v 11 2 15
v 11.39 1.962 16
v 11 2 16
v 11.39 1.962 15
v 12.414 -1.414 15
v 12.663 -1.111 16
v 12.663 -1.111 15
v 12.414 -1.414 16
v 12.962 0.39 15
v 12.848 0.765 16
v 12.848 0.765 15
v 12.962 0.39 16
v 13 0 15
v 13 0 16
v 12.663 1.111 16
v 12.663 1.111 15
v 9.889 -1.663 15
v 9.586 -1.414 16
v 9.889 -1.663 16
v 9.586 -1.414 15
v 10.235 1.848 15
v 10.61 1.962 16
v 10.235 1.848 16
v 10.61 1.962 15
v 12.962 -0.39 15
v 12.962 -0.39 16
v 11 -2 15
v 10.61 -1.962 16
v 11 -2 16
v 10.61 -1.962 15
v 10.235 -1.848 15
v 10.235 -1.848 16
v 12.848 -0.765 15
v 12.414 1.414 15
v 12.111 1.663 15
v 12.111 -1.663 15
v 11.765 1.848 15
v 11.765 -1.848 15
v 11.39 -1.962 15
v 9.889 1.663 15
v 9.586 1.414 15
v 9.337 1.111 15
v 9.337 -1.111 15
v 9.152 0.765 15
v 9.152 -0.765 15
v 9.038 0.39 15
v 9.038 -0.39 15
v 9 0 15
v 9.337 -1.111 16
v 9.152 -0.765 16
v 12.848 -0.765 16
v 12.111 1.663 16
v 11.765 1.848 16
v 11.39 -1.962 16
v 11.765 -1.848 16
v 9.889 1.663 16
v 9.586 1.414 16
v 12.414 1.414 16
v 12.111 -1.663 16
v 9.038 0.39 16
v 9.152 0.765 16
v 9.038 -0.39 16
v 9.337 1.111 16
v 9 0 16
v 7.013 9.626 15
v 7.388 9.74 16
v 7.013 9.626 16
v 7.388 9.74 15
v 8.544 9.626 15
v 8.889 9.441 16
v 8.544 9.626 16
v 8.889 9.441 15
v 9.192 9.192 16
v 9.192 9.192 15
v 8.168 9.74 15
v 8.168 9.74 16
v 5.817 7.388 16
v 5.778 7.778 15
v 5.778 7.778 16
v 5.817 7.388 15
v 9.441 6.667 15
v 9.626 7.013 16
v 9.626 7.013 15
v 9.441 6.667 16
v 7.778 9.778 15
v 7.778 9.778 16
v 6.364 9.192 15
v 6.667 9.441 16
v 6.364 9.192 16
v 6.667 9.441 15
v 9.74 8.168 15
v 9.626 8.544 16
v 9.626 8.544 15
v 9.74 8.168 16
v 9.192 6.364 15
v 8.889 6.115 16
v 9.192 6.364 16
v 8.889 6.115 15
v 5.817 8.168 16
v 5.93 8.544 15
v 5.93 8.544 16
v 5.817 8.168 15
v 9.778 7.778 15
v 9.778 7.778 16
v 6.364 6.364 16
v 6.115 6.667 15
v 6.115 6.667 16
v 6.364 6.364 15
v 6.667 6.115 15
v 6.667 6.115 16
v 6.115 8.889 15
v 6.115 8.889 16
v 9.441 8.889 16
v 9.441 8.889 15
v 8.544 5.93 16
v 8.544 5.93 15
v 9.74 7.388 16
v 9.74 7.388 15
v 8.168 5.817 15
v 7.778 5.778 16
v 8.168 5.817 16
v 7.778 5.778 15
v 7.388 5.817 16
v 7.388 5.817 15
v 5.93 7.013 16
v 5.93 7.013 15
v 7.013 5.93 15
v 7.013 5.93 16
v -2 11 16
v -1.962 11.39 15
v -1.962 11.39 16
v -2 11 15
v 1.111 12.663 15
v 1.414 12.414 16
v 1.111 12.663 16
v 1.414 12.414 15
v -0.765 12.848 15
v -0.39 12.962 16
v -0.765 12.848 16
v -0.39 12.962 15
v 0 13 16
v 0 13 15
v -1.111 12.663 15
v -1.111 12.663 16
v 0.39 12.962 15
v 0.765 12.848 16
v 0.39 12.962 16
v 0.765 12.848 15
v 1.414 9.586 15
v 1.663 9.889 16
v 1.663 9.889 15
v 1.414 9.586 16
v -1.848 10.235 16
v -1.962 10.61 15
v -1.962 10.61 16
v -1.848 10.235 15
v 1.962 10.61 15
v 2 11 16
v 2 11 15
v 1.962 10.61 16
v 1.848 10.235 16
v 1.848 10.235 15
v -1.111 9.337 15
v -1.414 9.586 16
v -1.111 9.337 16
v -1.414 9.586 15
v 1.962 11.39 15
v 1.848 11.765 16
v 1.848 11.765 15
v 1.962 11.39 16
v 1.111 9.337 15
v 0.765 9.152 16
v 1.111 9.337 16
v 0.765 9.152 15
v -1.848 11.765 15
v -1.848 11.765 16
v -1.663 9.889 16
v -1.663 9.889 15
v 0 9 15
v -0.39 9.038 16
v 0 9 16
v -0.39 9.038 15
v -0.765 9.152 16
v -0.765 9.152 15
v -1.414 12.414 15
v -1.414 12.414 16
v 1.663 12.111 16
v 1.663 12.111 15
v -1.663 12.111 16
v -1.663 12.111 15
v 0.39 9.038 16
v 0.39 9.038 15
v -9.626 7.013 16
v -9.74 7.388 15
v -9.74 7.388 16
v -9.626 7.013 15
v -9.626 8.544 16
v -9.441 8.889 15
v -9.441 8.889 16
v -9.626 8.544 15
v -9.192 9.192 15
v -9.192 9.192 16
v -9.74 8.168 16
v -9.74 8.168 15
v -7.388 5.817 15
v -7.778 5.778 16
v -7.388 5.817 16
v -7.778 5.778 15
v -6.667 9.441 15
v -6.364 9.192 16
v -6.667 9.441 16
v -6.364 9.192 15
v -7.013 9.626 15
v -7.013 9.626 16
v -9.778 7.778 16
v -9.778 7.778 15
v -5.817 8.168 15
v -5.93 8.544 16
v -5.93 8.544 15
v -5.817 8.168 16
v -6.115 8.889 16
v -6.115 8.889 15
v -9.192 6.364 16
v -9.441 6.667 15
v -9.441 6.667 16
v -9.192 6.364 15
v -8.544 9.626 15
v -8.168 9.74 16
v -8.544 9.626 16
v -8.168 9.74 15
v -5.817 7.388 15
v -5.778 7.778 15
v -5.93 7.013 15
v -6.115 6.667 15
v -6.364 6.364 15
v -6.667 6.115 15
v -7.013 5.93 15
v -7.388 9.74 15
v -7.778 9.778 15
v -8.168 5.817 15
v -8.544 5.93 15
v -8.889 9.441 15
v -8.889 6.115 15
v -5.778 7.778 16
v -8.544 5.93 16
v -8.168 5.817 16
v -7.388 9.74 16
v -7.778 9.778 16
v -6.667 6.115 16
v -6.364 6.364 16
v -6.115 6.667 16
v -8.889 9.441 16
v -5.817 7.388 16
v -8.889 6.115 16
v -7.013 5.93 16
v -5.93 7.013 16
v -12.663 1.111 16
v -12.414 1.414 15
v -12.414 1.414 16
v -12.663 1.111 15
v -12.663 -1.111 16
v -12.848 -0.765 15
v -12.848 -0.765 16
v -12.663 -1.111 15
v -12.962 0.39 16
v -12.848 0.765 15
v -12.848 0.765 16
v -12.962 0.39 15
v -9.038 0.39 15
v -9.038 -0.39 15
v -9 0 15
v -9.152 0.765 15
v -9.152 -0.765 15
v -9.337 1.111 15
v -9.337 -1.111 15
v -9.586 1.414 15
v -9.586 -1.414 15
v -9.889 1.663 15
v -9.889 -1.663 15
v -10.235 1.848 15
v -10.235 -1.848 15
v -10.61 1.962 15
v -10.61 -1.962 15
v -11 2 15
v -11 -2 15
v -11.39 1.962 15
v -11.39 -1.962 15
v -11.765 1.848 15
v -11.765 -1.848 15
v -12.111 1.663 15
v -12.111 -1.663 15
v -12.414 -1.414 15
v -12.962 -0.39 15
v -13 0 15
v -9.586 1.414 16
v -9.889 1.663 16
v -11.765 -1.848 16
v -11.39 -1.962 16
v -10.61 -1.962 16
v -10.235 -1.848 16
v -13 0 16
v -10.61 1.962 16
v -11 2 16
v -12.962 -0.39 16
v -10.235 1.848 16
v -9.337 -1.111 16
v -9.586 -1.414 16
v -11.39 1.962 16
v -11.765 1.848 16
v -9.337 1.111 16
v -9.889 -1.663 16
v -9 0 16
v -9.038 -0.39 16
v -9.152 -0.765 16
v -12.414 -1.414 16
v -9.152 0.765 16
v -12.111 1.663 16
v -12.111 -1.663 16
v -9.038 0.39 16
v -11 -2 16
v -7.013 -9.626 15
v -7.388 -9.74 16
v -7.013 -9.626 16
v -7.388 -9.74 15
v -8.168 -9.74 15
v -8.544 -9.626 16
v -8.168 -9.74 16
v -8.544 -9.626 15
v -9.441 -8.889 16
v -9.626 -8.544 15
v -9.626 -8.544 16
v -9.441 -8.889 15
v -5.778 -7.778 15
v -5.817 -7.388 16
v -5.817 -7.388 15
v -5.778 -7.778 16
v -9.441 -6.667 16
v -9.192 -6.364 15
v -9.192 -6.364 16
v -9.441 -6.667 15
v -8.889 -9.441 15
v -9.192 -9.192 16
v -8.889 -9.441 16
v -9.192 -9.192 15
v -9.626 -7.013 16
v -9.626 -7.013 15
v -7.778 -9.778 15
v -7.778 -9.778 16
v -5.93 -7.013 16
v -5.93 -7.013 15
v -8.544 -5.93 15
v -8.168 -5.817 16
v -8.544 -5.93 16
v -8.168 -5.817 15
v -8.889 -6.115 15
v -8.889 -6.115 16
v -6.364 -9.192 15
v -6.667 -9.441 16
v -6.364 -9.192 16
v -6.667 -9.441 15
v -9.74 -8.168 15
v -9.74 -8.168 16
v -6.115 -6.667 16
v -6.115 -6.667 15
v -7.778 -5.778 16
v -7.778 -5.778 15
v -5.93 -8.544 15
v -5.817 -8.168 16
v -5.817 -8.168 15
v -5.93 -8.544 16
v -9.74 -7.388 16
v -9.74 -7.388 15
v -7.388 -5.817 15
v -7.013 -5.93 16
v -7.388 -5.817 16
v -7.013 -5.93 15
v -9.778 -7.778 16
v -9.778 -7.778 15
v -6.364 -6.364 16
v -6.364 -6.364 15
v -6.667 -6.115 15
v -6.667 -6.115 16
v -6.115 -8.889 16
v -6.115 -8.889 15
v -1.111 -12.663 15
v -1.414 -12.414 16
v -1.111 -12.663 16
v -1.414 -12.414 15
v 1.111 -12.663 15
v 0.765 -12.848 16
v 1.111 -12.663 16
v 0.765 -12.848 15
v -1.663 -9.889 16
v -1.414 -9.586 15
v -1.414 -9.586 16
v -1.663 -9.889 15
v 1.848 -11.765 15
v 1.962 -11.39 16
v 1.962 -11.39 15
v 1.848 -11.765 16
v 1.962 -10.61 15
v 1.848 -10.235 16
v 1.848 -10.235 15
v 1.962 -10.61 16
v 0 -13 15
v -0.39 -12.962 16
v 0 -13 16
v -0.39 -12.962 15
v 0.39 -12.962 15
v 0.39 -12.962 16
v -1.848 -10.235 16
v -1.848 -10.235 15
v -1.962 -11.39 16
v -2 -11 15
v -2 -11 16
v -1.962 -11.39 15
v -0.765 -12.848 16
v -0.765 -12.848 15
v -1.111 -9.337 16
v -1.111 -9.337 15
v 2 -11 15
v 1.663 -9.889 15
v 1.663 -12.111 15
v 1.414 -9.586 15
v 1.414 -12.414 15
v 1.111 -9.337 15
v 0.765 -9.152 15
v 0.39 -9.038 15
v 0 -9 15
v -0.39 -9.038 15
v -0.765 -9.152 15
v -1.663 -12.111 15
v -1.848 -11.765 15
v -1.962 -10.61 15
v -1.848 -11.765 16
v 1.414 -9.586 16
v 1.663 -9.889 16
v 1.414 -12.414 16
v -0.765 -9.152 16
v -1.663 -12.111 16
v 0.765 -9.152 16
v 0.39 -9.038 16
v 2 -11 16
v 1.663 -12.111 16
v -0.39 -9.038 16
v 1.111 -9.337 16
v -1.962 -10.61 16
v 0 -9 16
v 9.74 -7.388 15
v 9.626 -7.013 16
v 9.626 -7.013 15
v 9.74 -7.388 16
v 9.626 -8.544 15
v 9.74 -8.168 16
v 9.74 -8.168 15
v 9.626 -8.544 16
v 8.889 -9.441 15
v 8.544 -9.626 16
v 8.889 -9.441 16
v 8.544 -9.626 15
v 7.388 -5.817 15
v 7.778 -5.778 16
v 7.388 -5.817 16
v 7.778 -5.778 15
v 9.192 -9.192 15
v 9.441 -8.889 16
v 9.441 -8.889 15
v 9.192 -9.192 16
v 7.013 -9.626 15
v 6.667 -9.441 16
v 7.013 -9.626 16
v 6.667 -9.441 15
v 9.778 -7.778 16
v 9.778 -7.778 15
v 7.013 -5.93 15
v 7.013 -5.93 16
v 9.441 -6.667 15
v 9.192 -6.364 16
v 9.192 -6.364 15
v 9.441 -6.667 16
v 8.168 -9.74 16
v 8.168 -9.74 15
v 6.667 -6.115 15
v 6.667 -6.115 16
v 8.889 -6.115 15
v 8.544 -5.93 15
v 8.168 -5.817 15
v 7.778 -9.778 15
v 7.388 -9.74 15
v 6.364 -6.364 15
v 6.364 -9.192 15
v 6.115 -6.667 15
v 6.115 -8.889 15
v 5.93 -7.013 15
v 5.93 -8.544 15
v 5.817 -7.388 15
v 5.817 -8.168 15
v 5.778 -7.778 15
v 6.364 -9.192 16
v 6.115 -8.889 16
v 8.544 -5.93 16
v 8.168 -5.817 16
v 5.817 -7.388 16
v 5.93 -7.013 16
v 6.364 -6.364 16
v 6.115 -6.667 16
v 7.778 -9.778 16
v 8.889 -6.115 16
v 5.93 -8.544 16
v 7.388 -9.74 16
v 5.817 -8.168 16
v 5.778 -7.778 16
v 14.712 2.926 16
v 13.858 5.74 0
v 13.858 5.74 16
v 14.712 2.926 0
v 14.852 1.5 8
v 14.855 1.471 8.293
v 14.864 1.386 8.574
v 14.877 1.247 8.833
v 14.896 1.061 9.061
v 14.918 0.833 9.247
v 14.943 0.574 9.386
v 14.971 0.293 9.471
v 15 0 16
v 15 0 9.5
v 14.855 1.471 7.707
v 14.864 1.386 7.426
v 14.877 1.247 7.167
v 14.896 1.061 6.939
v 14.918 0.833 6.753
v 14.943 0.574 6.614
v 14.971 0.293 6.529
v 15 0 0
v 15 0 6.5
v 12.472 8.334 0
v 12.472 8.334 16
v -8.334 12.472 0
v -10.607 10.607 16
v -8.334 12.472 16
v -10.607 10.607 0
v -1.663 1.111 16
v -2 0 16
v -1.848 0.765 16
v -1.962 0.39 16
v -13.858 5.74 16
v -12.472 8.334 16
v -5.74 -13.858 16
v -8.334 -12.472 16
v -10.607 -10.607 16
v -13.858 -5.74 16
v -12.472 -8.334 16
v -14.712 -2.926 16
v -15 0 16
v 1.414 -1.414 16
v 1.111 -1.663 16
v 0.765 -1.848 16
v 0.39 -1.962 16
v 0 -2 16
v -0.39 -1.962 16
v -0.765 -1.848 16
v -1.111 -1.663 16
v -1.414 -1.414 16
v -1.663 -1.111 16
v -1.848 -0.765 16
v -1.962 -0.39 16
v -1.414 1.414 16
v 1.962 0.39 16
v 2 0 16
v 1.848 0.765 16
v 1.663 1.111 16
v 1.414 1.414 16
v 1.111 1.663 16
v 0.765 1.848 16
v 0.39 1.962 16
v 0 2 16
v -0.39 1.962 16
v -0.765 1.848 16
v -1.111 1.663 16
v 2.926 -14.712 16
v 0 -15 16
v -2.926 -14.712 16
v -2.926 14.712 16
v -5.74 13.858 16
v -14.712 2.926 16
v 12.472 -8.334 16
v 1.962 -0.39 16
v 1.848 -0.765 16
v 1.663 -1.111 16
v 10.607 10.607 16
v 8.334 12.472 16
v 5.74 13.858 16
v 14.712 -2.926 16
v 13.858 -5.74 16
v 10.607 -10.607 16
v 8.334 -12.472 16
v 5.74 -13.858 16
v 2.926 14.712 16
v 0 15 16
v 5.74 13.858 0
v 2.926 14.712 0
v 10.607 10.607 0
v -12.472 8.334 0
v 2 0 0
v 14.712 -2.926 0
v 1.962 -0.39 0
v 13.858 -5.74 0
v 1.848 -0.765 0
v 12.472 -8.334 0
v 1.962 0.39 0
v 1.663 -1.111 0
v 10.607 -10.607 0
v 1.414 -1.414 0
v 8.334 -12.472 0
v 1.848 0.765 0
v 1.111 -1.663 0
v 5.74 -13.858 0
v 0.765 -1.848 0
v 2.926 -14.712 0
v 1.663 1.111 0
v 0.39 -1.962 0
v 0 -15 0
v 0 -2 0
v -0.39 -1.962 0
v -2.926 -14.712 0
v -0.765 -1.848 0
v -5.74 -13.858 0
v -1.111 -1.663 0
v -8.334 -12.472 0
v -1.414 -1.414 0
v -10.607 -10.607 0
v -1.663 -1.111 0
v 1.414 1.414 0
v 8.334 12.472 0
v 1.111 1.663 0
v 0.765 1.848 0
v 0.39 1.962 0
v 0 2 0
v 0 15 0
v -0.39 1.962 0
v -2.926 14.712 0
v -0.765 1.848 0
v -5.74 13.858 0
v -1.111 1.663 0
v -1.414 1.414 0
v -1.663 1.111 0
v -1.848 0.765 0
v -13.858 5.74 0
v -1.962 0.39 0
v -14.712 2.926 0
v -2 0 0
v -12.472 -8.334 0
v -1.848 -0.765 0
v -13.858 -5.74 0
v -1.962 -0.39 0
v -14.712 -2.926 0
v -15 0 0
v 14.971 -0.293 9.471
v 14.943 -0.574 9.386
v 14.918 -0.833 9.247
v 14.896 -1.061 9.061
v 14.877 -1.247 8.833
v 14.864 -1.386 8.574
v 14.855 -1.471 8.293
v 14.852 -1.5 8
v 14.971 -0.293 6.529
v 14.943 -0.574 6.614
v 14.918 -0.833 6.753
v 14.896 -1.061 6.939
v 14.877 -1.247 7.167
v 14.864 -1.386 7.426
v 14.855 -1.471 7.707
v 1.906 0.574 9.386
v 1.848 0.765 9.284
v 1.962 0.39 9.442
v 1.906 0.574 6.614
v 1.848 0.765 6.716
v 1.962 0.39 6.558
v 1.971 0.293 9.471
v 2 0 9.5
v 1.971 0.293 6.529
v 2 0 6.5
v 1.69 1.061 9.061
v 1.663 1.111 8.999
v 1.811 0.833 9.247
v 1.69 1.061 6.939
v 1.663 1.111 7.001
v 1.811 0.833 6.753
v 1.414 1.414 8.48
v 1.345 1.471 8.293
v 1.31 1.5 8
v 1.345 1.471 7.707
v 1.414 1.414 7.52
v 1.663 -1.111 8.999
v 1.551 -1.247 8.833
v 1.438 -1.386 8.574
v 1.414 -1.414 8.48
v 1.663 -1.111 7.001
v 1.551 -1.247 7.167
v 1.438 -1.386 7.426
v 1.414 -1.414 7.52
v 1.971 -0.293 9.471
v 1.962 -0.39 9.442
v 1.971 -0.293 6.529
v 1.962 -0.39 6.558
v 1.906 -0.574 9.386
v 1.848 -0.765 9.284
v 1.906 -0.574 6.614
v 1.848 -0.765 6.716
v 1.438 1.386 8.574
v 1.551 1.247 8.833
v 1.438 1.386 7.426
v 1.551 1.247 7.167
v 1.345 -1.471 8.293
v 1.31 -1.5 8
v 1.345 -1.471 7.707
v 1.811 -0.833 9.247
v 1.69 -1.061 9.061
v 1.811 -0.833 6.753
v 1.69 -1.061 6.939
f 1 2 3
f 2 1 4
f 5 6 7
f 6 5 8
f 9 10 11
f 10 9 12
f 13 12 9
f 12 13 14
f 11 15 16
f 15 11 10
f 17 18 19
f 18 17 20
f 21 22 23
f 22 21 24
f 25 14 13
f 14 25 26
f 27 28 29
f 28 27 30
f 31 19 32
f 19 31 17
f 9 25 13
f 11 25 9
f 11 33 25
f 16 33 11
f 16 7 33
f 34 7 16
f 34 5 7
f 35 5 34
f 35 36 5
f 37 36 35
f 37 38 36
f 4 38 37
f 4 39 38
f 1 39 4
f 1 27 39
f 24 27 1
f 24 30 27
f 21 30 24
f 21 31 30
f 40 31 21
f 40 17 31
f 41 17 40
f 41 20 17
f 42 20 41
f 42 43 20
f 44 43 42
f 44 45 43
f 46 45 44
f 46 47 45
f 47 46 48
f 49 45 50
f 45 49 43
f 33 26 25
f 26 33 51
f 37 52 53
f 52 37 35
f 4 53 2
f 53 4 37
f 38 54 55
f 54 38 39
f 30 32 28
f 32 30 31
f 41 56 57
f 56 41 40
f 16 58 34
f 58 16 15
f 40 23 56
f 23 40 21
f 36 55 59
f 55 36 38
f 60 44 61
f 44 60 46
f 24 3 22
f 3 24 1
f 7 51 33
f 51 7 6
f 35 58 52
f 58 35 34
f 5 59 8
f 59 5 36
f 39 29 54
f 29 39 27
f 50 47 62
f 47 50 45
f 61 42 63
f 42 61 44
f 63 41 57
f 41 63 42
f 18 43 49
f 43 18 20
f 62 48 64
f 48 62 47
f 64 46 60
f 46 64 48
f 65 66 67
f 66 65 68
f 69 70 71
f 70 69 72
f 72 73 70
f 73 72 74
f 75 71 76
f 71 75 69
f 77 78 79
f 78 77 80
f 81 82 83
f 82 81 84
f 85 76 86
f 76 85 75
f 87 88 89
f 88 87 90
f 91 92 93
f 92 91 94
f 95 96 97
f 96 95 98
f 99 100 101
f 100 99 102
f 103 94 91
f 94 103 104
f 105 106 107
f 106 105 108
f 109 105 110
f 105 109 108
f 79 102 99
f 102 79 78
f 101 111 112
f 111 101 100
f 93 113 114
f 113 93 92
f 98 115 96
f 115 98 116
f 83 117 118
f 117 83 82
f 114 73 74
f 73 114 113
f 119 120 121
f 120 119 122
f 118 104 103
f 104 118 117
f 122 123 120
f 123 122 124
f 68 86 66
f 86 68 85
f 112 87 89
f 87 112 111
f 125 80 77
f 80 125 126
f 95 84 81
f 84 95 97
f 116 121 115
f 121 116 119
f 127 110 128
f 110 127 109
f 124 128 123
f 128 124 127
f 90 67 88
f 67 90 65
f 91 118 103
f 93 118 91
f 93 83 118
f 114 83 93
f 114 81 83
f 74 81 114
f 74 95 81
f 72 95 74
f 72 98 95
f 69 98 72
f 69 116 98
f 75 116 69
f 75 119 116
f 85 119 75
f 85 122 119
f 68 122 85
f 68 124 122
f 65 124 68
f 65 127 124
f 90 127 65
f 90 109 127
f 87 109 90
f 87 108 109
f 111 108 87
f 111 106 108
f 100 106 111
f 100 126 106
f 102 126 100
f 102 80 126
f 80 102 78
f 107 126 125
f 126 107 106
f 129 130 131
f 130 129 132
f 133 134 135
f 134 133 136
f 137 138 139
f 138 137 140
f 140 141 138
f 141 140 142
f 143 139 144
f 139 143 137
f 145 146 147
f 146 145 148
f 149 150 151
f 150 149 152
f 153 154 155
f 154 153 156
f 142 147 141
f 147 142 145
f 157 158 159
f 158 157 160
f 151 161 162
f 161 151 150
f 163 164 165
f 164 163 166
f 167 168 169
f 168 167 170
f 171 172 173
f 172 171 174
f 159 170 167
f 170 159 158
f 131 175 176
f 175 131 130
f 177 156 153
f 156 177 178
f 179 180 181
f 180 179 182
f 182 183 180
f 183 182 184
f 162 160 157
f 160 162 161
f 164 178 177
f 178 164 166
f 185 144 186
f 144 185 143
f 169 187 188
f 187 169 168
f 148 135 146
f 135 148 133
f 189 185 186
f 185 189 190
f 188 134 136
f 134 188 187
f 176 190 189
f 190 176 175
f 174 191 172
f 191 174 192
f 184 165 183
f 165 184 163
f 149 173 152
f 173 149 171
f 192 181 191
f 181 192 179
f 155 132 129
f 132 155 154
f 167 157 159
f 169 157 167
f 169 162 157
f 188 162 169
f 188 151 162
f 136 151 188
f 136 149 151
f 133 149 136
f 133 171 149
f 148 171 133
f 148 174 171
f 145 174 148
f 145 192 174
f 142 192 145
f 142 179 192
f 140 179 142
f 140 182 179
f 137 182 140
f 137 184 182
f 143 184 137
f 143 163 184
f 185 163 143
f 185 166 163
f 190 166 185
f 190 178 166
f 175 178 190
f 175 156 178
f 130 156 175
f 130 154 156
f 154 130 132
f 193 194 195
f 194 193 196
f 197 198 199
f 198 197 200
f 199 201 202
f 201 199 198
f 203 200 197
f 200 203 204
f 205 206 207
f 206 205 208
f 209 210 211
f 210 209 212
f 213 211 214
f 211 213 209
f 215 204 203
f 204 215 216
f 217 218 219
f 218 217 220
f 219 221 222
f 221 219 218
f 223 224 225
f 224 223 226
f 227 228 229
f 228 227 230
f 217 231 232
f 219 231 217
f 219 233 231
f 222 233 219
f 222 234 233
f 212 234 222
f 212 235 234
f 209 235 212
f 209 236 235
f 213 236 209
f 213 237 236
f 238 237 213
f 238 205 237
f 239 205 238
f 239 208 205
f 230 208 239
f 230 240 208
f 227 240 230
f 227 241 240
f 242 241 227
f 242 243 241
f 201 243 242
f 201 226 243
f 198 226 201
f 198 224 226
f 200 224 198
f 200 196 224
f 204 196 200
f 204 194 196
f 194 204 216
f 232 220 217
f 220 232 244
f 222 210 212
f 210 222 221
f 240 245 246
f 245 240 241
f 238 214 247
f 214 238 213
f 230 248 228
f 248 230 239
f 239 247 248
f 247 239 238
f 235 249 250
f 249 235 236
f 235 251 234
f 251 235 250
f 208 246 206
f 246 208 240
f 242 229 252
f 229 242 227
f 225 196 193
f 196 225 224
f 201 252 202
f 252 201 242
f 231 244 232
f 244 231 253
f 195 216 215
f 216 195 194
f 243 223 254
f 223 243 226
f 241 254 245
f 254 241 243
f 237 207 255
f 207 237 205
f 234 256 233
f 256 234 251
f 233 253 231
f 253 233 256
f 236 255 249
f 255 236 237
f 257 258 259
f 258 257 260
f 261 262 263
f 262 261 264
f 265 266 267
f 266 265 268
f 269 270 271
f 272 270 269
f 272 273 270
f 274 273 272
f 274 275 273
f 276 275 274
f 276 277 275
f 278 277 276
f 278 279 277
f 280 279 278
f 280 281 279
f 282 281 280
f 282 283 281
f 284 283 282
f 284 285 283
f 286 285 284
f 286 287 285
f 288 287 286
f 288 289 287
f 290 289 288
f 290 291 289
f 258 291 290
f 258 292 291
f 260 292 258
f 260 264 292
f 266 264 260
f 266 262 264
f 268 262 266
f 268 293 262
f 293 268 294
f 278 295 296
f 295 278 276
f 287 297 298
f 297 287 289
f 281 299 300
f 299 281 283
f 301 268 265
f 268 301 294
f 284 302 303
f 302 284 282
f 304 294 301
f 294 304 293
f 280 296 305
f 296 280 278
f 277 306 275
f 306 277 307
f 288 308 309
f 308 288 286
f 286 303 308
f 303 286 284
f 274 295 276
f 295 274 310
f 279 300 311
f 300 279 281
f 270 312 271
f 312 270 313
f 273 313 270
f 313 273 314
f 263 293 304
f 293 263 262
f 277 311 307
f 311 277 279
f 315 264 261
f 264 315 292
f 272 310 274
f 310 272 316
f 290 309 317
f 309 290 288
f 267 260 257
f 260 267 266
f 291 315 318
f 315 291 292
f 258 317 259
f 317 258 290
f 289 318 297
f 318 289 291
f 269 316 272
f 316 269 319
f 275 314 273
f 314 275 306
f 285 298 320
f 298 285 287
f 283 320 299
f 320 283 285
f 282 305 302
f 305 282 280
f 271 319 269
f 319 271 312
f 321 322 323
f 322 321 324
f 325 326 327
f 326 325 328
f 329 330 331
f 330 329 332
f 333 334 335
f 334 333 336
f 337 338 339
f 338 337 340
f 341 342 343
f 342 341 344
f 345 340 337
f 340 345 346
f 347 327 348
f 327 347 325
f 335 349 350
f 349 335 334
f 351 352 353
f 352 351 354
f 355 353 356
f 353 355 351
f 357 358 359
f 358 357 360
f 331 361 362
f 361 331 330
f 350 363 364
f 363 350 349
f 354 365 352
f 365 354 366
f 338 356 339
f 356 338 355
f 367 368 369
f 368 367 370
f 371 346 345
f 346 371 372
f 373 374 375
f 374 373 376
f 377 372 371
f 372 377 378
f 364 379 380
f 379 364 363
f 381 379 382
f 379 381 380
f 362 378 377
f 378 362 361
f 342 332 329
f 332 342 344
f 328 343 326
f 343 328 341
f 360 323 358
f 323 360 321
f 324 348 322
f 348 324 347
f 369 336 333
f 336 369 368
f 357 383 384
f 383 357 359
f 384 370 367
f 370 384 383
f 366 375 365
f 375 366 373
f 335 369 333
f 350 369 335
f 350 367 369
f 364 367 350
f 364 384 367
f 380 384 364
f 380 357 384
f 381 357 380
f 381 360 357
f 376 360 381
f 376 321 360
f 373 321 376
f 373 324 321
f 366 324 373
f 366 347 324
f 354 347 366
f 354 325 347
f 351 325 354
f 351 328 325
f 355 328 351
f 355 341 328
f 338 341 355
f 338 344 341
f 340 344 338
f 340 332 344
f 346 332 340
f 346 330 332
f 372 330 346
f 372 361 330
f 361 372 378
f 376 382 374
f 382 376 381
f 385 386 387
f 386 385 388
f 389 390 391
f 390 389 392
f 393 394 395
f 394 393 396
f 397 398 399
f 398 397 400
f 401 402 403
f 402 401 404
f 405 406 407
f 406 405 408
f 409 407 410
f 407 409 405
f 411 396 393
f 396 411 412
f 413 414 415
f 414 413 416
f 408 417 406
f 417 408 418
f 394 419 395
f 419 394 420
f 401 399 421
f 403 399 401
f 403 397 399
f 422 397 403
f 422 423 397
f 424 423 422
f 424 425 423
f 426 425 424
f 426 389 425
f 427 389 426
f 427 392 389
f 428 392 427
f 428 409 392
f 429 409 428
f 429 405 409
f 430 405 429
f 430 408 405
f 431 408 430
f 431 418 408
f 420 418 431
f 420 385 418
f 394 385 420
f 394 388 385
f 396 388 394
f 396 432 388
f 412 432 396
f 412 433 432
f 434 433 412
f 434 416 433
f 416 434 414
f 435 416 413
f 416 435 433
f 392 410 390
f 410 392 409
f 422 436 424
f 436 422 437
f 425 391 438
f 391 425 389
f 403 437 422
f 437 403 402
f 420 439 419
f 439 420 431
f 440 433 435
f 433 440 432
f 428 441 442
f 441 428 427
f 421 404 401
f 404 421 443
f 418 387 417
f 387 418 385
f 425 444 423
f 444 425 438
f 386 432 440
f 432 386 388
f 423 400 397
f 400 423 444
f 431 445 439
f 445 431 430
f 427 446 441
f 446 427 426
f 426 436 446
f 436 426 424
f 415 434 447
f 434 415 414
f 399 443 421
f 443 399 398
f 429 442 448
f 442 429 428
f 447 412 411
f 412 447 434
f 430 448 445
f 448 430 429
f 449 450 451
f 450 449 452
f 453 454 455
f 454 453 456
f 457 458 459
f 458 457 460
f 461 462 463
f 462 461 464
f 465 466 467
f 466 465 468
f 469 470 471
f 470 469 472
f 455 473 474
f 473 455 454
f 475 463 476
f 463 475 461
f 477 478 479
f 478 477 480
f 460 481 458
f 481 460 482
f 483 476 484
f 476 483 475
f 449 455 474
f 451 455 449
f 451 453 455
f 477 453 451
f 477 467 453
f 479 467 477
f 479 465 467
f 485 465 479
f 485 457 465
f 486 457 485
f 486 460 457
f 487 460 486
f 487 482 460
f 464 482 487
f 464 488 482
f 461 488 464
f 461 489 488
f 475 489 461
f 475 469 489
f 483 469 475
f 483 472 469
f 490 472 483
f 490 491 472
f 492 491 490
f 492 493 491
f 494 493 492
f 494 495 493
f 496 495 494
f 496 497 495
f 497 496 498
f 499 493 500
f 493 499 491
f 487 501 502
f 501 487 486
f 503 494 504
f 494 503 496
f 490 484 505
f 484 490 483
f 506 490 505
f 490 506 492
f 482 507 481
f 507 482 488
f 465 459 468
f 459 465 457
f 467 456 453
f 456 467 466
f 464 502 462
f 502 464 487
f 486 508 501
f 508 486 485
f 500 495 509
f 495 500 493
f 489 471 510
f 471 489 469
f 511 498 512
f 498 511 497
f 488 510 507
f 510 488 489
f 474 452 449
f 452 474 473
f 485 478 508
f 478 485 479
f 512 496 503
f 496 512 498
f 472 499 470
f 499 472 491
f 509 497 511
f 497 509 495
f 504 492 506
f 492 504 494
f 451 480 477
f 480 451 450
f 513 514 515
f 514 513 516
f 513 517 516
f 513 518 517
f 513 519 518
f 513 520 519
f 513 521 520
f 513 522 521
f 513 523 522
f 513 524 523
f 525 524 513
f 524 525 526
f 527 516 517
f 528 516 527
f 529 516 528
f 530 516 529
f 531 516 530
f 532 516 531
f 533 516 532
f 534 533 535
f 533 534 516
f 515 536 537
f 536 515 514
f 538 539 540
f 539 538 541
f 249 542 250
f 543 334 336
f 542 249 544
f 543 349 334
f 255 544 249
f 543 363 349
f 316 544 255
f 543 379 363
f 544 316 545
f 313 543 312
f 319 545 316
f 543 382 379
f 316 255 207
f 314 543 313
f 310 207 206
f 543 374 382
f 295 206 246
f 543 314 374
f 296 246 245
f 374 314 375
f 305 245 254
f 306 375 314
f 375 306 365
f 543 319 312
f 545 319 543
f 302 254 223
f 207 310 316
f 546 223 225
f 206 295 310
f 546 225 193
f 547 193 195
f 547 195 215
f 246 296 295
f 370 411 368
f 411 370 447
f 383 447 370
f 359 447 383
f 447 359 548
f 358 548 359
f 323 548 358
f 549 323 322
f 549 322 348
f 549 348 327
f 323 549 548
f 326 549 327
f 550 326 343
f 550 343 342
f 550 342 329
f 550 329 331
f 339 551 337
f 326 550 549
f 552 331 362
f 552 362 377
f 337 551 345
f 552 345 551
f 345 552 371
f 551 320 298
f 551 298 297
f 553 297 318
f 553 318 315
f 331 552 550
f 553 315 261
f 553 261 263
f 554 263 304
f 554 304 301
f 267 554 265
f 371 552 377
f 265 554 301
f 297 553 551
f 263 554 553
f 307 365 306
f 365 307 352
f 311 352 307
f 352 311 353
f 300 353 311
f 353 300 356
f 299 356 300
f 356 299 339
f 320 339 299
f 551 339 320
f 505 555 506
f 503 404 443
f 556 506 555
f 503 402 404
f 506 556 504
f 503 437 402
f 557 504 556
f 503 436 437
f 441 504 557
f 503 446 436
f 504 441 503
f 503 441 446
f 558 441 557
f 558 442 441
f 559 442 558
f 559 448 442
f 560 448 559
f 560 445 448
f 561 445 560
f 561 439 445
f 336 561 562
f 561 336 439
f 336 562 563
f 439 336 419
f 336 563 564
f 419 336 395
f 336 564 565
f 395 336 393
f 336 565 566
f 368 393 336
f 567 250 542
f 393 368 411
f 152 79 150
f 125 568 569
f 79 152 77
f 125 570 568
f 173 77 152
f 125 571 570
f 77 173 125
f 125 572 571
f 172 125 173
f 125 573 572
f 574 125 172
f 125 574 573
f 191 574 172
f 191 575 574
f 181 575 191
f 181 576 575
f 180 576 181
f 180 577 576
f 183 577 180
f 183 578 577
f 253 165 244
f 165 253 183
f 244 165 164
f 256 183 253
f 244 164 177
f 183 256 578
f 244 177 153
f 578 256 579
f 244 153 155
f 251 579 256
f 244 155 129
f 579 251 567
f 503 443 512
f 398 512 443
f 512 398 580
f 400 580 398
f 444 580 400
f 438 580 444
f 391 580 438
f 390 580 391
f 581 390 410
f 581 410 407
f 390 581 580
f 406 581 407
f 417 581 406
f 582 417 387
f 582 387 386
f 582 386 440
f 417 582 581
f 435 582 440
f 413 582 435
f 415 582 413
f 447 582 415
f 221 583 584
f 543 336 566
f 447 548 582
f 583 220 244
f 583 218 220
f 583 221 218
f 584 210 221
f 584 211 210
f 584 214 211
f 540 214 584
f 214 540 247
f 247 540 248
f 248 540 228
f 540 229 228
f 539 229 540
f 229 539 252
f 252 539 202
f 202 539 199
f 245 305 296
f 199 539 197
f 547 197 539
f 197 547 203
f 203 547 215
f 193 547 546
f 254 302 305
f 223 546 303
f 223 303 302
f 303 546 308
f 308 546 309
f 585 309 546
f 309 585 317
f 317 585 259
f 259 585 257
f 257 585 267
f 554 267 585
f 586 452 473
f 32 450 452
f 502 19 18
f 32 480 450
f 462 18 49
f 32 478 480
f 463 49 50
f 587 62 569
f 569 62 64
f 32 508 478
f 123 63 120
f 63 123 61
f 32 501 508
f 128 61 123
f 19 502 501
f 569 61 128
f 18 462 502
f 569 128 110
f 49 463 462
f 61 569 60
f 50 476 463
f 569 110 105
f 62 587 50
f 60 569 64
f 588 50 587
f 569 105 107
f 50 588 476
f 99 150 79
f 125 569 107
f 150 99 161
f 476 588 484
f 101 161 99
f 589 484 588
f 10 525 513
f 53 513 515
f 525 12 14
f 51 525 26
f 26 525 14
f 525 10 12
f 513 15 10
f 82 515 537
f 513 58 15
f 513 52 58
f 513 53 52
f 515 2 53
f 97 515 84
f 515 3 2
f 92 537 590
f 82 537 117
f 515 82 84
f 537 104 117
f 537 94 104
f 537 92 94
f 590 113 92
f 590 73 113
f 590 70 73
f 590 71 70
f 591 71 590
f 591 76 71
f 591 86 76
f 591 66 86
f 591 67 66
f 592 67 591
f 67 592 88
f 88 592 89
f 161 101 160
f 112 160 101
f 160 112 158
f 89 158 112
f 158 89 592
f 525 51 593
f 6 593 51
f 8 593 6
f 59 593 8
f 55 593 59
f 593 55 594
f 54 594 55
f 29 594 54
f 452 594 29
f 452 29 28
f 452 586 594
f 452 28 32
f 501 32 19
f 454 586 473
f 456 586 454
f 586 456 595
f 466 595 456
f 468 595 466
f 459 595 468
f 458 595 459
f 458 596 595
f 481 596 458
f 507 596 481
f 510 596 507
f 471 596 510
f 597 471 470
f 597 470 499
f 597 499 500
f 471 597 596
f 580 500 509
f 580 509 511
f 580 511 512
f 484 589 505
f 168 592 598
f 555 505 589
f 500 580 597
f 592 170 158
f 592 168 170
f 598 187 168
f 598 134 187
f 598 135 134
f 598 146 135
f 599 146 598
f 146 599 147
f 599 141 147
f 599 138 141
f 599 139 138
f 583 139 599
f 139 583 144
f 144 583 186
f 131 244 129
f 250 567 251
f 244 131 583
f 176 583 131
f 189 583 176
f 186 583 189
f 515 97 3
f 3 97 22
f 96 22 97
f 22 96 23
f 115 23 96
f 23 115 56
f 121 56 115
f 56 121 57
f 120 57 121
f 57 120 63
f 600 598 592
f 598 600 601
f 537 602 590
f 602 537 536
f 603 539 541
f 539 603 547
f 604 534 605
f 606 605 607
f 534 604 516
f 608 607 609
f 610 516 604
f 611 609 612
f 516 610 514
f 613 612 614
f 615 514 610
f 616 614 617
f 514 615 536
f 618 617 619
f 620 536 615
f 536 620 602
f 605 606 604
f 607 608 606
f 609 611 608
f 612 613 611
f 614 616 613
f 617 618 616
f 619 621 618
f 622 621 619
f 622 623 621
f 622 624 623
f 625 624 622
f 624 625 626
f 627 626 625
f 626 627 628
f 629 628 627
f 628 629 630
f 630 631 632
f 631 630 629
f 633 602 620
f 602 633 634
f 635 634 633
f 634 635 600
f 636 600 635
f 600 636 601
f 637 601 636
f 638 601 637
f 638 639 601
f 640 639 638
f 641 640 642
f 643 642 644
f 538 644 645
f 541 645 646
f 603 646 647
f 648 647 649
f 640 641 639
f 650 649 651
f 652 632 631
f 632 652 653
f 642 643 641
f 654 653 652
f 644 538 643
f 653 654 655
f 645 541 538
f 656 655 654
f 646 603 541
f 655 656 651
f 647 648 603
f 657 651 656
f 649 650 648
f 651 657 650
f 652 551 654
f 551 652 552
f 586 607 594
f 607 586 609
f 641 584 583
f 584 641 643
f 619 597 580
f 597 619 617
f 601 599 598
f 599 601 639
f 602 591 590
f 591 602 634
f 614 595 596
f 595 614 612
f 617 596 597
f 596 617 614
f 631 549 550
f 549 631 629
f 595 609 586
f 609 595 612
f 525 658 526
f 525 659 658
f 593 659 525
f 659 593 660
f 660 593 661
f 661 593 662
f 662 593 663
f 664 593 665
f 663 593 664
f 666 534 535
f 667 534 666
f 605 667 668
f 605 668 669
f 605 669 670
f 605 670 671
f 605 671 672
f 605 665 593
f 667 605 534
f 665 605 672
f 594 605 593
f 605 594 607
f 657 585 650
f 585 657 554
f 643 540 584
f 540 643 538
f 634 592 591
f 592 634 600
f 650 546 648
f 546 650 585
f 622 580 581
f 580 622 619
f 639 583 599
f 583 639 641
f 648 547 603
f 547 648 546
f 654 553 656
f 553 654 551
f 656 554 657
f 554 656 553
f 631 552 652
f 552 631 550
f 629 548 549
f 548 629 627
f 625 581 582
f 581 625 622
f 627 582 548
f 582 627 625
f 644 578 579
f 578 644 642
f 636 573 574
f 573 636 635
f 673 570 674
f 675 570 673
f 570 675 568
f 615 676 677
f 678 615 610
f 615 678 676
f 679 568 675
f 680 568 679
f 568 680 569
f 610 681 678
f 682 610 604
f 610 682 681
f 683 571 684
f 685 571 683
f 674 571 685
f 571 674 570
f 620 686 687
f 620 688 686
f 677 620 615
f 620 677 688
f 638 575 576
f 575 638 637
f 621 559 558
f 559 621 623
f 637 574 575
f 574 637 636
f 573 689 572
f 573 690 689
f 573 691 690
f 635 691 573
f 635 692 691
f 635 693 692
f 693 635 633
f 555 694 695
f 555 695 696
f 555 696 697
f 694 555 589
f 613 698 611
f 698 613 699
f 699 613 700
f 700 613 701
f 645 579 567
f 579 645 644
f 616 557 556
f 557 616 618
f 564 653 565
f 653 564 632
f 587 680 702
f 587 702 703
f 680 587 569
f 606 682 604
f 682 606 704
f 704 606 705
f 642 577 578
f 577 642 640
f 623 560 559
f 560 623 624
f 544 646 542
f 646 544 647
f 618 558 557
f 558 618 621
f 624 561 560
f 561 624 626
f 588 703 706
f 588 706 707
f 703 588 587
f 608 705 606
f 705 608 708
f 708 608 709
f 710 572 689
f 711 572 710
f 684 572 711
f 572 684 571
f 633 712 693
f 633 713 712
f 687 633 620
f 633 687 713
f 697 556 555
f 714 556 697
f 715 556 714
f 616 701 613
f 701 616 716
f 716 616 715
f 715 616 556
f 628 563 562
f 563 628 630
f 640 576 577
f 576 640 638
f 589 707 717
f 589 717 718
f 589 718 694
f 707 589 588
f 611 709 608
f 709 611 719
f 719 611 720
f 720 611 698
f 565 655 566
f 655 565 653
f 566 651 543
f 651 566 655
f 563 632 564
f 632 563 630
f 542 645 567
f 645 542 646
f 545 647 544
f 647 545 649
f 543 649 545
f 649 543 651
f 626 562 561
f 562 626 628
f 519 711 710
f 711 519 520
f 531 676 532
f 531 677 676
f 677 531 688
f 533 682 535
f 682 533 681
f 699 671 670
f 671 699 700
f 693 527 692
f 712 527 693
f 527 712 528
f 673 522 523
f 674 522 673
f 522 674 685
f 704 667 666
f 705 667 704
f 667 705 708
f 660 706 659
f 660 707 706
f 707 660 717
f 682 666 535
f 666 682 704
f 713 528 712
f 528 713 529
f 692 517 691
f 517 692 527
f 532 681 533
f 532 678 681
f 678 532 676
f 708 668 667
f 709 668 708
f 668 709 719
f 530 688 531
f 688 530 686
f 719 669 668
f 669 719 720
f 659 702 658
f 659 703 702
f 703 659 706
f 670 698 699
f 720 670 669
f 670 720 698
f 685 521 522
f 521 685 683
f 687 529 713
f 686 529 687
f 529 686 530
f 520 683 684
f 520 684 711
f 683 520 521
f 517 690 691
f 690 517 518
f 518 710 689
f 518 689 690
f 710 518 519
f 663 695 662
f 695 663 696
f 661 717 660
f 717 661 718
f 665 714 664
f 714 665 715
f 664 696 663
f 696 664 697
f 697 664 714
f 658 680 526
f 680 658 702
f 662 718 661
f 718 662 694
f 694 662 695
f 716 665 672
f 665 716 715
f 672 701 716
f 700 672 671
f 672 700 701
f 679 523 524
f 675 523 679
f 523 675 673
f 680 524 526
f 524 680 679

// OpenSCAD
$fn = 32;

// ----------------------------------------------------------------------
// Control knob: dimpled knob
// ----------------------------------------------------------------------

// --- parameters (mm) ---
dimp_d = 4;               // finger dimple diameter
n_dimp = 8;               // number of dimples
dimp_r = 11;              // dimple ring radius
knob_d = 30;              // knob body diameter
knob_h = 16;              // knob body height
bore_d = 4;               // shaft bore diameter
set_d = 3;                // set screw bore diameter

dimp_step = 360 / n_dimp;  // dimple angular step

difference() {
  cylinder(h = knob_h, d = knob_d);
  translate([0, 0, -1]) cylinder(h = knob_h + 2, d = bore_d);
  translate([-1, 0, knob_h / 2]) rotate([0, 90, 0])
    cylinder(h = knob_d / 2 + bore_d / 2 + 2, d = set_d);  for (i = [0 : n_dimp - 1])
    rotate([0, 0, i * dimp_step])
      translate([dimp_r, 0, knob_h - 1])
        cylinder(h = 2, d = dimp_d);
}
